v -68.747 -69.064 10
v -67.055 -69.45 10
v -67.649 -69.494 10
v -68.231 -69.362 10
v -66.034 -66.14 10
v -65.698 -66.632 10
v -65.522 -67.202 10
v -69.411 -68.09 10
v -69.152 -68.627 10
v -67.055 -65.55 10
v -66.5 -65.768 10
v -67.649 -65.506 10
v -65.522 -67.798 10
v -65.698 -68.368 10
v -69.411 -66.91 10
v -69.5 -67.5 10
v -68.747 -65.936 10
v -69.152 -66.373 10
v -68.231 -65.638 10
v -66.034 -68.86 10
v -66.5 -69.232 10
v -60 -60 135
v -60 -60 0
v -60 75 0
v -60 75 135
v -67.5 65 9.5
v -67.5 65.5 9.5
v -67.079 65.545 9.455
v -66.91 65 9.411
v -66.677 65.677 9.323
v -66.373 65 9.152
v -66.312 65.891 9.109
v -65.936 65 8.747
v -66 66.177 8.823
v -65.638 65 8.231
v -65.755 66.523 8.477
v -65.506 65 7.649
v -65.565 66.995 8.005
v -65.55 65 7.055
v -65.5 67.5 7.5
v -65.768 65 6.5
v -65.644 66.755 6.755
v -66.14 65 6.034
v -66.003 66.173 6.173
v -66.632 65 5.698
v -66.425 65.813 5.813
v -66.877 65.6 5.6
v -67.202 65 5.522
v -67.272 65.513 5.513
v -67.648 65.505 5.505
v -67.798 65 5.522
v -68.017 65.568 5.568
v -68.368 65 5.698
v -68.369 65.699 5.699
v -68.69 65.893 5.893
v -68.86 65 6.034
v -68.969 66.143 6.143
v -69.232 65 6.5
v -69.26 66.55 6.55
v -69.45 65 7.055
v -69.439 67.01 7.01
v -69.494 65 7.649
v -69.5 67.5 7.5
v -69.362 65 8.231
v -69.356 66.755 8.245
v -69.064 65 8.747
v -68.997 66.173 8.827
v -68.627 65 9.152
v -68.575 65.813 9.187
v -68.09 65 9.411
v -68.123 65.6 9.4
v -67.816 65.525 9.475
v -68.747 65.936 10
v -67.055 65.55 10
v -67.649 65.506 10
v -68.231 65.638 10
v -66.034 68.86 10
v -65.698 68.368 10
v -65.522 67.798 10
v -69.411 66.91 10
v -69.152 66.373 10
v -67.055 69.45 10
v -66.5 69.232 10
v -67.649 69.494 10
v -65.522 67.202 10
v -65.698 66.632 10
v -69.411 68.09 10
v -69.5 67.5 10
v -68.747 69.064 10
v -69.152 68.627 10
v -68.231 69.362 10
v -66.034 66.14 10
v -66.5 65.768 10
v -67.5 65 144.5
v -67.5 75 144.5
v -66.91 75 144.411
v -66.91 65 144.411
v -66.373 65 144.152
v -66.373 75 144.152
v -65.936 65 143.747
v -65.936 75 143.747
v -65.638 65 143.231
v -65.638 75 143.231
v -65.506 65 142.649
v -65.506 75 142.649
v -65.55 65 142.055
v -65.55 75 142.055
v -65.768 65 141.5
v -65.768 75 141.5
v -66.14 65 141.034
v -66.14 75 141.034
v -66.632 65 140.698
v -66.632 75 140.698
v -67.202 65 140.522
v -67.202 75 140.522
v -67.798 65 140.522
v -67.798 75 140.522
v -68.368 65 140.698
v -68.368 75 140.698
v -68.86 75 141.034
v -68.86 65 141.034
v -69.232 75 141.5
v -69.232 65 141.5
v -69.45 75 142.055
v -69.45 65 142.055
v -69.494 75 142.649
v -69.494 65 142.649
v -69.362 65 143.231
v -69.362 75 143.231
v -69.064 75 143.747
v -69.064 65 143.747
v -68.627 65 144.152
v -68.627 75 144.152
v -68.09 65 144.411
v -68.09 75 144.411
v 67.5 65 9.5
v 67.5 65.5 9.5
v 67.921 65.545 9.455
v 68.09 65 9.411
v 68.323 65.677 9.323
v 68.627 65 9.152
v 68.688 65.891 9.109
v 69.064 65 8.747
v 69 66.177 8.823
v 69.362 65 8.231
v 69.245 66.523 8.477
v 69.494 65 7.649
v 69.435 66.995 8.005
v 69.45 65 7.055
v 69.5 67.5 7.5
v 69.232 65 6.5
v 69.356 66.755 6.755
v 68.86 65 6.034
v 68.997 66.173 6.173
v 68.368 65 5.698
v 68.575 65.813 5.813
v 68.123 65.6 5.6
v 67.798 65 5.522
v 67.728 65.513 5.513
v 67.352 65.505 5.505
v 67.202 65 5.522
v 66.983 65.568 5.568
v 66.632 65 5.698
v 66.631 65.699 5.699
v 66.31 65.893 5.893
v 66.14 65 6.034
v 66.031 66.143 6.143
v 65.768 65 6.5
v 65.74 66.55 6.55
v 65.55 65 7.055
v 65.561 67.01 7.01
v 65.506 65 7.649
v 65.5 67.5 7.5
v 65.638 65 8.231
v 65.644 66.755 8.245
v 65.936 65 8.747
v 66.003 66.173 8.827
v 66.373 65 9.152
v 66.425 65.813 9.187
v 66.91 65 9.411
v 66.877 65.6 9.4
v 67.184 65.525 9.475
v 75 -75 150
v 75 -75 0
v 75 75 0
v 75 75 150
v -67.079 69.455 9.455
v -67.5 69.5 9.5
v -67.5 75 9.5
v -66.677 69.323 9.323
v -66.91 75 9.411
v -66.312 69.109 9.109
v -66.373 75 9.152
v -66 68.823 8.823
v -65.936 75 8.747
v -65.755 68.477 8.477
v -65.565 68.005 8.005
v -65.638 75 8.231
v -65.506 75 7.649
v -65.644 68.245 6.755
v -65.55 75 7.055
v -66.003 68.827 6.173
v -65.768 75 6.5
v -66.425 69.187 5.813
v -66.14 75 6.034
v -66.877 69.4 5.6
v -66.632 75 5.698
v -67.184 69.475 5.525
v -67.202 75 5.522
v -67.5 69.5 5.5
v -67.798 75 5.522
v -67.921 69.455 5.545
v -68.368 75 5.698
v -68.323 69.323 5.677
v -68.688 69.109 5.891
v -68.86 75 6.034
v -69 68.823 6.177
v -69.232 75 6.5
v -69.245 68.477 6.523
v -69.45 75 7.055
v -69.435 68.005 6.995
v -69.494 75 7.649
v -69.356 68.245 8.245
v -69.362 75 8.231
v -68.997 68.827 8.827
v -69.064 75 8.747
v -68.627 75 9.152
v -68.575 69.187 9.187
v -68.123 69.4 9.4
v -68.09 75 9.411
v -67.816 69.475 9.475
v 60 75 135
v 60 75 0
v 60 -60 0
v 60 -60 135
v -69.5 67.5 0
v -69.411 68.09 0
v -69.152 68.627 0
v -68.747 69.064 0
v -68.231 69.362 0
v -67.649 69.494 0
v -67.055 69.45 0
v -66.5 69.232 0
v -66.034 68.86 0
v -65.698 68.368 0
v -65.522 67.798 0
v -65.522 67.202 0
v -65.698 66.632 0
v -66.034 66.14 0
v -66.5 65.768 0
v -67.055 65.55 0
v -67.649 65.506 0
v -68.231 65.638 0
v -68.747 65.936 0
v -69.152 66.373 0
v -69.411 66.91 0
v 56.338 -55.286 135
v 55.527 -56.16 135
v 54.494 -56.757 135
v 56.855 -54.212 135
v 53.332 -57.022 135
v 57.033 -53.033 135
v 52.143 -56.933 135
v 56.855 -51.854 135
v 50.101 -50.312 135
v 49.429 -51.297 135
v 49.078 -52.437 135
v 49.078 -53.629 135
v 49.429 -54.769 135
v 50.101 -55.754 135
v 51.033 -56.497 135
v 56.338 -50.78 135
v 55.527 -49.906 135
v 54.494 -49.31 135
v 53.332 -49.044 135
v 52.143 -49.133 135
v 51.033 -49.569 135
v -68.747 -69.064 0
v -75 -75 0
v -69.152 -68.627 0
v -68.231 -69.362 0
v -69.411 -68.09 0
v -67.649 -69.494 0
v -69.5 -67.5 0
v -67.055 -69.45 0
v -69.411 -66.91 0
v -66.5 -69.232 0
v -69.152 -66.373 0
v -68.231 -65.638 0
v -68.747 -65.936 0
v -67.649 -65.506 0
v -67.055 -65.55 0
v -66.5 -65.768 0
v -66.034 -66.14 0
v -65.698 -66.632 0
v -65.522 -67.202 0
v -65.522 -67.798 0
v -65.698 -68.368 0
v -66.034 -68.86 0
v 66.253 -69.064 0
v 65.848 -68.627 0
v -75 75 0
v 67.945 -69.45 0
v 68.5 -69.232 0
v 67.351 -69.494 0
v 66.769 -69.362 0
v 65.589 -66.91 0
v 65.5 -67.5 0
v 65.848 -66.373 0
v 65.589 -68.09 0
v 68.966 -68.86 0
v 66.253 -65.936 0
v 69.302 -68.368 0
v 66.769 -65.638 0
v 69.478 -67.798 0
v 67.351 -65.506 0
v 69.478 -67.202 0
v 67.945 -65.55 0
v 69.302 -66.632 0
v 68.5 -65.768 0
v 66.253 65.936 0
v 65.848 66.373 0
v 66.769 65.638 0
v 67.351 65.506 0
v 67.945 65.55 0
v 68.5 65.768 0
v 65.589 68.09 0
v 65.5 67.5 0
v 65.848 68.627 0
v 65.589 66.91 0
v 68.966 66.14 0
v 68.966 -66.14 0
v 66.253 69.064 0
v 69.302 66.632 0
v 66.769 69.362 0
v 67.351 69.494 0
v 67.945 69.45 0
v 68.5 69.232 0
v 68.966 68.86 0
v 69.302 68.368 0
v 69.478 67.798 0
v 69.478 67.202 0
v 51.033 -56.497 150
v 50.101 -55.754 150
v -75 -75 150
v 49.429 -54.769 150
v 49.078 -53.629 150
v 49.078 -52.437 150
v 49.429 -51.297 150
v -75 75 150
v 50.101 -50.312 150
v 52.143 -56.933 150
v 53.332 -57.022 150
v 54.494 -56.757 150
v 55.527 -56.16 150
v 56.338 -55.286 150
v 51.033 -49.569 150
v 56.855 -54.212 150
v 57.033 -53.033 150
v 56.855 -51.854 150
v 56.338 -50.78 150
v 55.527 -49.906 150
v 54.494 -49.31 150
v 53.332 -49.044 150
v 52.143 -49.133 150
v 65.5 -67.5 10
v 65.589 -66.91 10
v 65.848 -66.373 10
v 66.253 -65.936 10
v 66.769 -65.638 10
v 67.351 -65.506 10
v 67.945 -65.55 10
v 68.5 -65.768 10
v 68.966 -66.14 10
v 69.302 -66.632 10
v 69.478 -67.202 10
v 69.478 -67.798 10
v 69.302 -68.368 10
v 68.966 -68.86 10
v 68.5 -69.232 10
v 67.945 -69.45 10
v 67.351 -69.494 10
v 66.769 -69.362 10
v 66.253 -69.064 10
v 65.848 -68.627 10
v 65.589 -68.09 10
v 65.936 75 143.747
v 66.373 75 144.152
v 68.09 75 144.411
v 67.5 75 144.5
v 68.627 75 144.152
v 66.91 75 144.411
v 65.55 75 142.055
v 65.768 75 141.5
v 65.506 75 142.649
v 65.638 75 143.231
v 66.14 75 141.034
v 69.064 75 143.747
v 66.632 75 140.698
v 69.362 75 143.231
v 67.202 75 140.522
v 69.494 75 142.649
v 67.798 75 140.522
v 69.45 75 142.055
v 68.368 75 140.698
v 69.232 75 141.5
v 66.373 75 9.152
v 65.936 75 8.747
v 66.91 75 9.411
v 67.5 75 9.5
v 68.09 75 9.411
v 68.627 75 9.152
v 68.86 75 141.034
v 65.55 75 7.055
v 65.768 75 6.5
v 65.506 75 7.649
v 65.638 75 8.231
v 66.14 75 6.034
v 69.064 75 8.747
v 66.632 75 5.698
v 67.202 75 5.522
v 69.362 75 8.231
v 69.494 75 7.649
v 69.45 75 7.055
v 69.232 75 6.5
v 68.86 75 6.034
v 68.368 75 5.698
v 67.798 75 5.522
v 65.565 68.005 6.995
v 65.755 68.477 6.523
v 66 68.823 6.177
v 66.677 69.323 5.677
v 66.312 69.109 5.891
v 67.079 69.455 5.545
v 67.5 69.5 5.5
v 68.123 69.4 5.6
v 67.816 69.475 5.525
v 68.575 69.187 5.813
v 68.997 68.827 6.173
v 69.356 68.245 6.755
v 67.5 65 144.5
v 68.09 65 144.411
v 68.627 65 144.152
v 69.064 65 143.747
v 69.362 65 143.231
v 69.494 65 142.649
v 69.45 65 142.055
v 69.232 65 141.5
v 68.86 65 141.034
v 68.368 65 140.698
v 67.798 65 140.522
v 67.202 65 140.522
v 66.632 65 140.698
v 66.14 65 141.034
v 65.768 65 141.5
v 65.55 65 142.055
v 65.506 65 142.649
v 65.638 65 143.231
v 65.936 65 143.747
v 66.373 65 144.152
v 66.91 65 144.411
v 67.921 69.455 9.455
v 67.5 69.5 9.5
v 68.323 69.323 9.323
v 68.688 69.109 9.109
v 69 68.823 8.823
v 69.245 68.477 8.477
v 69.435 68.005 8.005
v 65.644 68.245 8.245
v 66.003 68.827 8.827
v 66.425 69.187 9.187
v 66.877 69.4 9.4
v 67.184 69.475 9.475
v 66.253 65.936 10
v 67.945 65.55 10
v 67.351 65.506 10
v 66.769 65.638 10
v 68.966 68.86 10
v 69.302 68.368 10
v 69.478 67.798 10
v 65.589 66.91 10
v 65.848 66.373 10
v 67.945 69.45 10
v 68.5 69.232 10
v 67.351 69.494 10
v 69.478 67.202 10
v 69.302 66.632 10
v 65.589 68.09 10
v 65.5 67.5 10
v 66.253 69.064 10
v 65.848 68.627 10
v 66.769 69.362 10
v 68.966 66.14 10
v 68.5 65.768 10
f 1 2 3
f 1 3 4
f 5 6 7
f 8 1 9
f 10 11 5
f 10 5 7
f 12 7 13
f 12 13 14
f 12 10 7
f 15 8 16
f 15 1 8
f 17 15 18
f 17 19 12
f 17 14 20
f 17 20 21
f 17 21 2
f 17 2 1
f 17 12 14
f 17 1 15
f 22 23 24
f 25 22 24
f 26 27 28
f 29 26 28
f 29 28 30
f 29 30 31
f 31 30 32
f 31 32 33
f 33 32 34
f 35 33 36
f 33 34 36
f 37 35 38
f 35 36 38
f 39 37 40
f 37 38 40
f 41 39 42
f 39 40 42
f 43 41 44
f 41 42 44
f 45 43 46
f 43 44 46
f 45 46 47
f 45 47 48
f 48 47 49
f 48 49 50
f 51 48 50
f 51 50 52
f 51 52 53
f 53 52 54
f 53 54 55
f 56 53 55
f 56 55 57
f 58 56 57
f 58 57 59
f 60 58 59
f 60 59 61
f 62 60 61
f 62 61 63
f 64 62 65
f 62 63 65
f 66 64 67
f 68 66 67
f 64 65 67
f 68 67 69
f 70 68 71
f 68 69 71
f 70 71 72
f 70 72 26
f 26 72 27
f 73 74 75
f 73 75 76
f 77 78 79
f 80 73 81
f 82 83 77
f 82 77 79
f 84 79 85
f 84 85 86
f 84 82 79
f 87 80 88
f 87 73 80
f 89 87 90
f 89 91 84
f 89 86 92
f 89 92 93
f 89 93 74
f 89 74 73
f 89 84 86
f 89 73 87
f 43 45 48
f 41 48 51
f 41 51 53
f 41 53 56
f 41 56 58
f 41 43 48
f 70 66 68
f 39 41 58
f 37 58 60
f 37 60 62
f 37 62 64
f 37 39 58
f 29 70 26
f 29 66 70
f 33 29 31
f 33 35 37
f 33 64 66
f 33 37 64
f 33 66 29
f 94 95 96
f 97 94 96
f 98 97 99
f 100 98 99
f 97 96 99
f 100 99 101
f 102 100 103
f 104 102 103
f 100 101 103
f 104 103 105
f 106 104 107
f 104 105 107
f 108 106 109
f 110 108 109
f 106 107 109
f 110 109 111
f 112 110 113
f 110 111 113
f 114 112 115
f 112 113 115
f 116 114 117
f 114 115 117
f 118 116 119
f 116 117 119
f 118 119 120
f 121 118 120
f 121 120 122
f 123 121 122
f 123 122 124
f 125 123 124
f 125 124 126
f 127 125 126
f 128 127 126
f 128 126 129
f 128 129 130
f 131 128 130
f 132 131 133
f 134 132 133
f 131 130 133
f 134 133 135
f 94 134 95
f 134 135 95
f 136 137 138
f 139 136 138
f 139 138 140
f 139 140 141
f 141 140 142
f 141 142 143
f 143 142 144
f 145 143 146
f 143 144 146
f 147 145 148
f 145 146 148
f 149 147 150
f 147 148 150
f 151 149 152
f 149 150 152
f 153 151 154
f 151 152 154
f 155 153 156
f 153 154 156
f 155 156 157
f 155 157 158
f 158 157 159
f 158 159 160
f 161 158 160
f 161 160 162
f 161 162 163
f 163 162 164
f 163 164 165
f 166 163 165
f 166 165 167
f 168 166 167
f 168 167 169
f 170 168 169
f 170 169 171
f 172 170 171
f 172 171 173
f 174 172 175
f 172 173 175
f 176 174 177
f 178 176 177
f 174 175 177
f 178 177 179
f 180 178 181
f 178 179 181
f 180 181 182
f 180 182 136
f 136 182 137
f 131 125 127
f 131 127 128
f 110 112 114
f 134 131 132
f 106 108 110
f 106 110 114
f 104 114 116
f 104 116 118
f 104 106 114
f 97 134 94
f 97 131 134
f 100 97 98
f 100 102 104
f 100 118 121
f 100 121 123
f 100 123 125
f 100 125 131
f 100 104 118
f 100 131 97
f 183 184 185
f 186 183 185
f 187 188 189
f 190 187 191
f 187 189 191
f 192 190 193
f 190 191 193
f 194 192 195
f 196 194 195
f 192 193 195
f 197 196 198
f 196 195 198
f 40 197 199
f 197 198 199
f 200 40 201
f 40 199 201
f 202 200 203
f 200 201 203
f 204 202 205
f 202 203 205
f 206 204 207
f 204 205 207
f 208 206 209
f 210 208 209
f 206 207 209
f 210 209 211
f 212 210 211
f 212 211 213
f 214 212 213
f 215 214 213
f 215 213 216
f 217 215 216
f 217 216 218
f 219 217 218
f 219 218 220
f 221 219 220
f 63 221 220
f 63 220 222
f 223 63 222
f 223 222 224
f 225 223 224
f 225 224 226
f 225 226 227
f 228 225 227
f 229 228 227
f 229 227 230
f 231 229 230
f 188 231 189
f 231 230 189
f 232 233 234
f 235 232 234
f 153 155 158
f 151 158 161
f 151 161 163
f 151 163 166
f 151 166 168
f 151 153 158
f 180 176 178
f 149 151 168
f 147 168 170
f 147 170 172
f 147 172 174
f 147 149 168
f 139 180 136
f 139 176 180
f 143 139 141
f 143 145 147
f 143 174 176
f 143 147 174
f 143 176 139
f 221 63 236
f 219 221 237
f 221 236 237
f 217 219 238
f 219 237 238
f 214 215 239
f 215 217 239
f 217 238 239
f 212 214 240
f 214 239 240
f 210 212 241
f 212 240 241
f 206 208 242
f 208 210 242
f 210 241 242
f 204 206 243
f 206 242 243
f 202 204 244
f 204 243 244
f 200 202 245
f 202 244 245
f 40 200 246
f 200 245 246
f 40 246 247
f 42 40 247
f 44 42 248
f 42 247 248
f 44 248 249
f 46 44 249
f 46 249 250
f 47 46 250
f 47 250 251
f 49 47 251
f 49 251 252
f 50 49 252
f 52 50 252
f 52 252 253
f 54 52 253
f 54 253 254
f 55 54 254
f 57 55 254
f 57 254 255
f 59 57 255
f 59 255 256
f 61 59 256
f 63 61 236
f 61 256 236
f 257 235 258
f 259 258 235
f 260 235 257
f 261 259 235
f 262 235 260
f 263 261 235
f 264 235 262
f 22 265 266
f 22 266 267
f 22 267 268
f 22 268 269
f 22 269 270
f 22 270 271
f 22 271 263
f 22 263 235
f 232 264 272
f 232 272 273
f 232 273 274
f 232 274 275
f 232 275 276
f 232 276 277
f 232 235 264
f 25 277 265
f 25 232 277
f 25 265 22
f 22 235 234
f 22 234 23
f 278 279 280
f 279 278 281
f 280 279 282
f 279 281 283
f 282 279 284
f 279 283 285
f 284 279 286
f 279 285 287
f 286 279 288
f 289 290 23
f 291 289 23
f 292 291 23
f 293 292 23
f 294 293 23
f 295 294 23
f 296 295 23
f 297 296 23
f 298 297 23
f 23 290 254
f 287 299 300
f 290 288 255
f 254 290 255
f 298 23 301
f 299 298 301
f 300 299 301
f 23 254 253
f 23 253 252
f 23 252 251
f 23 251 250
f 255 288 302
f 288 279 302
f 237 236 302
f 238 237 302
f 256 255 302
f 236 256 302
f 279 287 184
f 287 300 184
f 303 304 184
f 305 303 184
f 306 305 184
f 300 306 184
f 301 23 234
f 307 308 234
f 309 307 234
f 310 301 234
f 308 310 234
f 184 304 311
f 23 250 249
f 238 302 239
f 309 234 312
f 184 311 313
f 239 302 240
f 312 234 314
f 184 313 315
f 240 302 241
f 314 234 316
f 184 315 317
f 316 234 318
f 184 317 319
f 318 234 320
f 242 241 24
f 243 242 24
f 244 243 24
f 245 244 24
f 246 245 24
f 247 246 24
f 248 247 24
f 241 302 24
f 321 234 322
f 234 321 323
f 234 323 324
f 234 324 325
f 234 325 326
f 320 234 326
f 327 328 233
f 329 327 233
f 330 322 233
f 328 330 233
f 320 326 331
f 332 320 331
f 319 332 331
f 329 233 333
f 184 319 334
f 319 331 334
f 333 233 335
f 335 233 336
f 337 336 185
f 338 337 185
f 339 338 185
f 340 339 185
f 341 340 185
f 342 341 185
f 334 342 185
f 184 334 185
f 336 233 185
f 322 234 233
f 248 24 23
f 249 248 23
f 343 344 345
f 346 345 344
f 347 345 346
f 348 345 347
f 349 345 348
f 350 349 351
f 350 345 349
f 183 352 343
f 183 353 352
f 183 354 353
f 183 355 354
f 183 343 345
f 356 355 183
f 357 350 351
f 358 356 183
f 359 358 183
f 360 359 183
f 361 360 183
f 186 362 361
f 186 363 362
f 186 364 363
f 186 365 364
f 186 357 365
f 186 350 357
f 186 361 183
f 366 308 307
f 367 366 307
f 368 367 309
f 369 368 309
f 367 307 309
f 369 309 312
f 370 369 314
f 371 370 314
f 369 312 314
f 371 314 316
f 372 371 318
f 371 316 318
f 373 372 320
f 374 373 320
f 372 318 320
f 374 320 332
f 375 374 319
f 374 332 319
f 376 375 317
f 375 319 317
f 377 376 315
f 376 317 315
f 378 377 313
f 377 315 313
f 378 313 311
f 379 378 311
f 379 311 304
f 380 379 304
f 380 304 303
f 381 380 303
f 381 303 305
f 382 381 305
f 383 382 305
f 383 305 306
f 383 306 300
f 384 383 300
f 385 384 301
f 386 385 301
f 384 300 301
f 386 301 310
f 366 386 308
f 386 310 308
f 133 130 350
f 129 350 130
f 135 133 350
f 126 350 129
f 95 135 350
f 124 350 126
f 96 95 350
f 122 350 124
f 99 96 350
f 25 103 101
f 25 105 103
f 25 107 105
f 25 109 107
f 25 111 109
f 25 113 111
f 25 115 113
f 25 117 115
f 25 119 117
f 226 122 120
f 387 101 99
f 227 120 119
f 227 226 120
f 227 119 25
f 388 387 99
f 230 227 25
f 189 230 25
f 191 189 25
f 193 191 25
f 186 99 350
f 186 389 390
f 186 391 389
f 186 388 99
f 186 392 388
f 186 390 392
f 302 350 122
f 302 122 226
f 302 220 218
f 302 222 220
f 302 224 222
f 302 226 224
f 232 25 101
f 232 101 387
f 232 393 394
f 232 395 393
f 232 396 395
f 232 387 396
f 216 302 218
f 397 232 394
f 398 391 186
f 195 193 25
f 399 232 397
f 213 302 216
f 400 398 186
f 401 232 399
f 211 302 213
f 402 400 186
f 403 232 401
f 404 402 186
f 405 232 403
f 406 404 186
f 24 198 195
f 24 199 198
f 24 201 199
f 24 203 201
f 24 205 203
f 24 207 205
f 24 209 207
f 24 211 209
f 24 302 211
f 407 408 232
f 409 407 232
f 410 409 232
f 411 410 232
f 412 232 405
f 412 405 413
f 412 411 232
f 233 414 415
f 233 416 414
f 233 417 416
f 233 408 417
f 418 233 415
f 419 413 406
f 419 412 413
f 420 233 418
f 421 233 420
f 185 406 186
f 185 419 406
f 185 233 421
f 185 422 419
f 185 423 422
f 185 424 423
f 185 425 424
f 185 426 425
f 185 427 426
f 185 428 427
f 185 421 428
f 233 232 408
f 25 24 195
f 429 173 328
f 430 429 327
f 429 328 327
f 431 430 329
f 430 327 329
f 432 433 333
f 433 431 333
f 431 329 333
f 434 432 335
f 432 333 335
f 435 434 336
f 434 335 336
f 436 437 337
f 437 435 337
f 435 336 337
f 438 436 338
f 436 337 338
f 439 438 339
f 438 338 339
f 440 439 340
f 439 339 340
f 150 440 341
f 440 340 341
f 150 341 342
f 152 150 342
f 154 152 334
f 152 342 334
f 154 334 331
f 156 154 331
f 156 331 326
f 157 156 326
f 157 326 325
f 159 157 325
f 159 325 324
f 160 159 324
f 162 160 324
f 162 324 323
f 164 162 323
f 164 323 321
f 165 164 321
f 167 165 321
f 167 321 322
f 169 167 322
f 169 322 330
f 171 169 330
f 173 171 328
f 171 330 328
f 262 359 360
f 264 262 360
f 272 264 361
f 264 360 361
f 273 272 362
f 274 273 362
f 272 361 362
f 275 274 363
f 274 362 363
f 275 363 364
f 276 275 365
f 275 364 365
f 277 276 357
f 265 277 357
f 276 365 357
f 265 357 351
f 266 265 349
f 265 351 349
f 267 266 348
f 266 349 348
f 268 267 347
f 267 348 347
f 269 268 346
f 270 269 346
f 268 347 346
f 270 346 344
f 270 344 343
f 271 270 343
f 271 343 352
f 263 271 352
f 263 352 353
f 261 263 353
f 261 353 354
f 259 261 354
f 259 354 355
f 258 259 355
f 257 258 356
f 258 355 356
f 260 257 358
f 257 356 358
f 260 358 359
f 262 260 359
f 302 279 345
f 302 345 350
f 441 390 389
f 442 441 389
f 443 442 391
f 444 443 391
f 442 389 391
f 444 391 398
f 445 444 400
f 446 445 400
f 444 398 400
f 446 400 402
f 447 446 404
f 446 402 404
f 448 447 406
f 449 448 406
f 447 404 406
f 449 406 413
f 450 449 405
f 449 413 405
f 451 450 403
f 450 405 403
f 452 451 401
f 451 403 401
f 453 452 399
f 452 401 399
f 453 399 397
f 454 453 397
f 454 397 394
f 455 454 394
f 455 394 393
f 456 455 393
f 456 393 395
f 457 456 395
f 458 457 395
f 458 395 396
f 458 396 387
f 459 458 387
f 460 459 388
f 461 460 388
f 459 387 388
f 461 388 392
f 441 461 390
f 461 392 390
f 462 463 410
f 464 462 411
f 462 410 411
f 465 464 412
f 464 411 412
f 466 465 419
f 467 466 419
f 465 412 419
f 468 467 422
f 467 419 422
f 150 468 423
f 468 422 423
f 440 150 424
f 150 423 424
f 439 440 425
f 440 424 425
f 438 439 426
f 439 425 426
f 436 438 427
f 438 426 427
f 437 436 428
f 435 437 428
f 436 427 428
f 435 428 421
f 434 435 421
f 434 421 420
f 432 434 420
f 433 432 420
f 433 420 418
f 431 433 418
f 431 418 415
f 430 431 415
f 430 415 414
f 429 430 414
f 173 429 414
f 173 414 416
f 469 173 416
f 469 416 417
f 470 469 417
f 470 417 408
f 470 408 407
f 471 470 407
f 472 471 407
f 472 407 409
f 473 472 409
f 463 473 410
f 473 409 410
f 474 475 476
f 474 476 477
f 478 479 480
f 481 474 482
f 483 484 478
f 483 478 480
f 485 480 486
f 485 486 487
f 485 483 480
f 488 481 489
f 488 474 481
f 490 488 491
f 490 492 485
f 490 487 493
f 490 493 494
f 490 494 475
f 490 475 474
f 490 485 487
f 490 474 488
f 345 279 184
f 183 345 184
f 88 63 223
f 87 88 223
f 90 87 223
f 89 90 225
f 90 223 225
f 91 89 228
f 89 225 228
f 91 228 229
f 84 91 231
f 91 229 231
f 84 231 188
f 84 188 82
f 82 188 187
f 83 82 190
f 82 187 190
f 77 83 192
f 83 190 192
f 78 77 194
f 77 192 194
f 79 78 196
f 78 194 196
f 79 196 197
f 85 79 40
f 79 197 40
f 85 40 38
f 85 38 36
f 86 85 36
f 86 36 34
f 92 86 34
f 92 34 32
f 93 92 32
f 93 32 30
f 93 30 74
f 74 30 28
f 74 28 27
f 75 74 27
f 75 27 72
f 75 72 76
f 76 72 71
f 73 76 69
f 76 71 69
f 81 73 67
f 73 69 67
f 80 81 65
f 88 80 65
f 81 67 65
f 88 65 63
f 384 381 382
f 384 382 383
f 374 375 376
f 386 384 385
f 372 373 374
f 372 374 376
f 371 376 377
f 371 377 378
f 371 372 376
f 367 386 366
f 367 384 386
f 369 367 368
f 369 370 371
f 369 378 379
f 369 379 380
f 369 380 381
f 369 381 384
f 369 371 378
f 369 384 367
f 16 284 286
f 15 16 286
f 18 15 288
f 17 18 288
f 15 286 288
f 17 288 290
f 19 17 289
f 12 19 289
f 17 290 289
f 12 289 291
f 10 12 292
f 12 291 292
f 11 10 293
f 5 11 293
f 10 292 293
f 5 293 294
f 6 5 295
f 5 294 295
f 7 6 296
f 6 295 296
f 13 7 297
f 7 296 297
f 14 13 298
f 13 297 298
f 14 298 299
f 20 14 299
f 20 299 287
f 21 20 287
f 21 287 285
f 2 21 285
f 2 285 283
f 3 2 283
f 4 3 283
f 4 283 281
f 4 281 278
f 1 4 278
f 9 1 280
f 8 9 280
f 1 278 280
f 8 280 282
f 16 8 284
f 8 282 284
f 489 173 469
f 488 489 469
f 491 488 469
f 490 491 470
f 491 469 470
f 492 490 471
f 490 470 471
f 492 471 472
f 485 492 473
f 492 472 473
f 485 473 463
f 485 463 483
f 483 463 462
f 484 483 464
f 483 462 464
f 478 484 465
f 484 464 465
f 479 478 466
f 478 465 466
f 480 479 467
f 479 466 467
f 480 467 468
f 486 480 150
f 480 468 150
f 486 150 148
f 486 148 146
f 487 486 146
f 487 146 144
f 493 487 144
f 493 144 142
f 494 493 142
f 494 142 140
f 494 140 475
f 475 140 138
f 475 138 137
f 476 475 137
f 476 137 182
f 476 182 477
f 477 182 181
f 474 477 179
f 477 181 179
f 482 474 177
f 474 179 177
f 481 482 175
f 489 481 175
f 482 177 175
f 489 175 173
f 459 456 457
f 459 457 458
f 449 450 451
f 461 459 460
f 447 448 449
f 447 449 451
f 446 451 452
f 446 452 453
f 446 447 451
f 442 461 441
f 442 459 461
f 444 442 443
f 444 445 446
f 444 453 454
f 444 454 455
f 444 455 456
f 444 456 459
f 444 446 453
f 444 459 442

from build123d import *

# Parameters (mm, degrees)
CROQUIS1_W              = 150
CROQUIS1_H              = 150
SALIENTE_EXTRUIR1_DEPTH = 150
CROQUIS2_W              = 120
CROQUIS2_H              = 15
CROQUIS2_H_2            = 120
CORTAR_EXTRUIR1_DEPTH   = 135
CROQUIS3_R              = 2
CORTAR_EXTRUIR2_DEPTH   = 10
CROQUIS4_R              = 2
CORTAR_EXTRUIR3_DEPTH   = 10
CROQUIS5_R              = 4
CORTAR_EXTRUIR4_DEPTH   = 15


with BuildPart() as part:
    # Croquis1 → Saliente-Extruir1 (new body)
    with BuildSketch(Plane.XY):
        Rectangle(CROQUIS1_W, CROQUIS1_H)
    extrude(amount=SALIENTE_EXTRUIR1_DEPTH)

    # Croquis2 → Cortar-Extruir1 (cut)
    with BuildSketch(Plane(origin=(0, 0, 0), x_dir=(-1, 0, 0), z_dir=(0, 0, -1))):
        with Locations((0, 67.5)):
            Rectangle(CROQUIS2_W, CROQUIS2_H)
        Rectangle(CROQUIS2_W, CROQUIS2_H_2)
    extrude(amount=-CORTAR_EXTRUIR1_DEPTH, mode=Mode.SUBTRACT)

    # Croquis3 → Cortar-Extruir2 (cut)
    with BuildSketch(Plane(origin=(0, 75, 0), x_dir=(1, 0, 0), z_dir=(0, 1, 0))):
        with Locations(Location((-67.5, -142.5, 0), (0, 0, 270))):
            Circle(CROQUIS3_R)
        with Locations(Location((67.5, -142.5, 0), (0, 0, 270))):
            Circle(CROQUIS3_R)
        with Locations(Location((67.5, -7.5, 0), (0, 0, 270))):
            Circle(CROQUIS3_R)
        with Locations(Location((-67.5, -7.5, 0), (0, 0, 270))):
            Circle(CROQUIS3_R)
    extrude(amount=-CORTAR_EXTRUIR2_DEPTH, mode=Mode.SUBTRACT)

    # Croquis4 → Cortar-Extruir3 (cut)
    with BuildSketch(Plane(origin=(0, 0, 0), x_dir=(-1, 0, 0), z_dir=(0, 0, -1))):
        with Locations((-67.5, -67.5)):
            Circle(CROQUIS4_R)
        with Locations((67.5, -67.5)):
            Circle(CROQUIS4_R)
        with Locations((67.5, 67.5)):
            Circle(CROQUIS4_R)
        with Locations((-67.5, 67.5)):
            Circle(CROQUIS4_R)
    extrude(amount=-CORTAR_EXTRUIR3_DEPTH, mode=Mode.SUBTRACT)

    # Croquis5 → Cortar-Extruir4 (cut)
    with BuildSketch(Plane.XY.offset(150)):
        with Locations((53.033008589, -53.033008589)):
            Circle(CROQUIS5_R)
    extrude(amount=-CORTAR_EXTRUIR4_DEPTH, mode=Mode.SUBTRACT)


solid = part.part
